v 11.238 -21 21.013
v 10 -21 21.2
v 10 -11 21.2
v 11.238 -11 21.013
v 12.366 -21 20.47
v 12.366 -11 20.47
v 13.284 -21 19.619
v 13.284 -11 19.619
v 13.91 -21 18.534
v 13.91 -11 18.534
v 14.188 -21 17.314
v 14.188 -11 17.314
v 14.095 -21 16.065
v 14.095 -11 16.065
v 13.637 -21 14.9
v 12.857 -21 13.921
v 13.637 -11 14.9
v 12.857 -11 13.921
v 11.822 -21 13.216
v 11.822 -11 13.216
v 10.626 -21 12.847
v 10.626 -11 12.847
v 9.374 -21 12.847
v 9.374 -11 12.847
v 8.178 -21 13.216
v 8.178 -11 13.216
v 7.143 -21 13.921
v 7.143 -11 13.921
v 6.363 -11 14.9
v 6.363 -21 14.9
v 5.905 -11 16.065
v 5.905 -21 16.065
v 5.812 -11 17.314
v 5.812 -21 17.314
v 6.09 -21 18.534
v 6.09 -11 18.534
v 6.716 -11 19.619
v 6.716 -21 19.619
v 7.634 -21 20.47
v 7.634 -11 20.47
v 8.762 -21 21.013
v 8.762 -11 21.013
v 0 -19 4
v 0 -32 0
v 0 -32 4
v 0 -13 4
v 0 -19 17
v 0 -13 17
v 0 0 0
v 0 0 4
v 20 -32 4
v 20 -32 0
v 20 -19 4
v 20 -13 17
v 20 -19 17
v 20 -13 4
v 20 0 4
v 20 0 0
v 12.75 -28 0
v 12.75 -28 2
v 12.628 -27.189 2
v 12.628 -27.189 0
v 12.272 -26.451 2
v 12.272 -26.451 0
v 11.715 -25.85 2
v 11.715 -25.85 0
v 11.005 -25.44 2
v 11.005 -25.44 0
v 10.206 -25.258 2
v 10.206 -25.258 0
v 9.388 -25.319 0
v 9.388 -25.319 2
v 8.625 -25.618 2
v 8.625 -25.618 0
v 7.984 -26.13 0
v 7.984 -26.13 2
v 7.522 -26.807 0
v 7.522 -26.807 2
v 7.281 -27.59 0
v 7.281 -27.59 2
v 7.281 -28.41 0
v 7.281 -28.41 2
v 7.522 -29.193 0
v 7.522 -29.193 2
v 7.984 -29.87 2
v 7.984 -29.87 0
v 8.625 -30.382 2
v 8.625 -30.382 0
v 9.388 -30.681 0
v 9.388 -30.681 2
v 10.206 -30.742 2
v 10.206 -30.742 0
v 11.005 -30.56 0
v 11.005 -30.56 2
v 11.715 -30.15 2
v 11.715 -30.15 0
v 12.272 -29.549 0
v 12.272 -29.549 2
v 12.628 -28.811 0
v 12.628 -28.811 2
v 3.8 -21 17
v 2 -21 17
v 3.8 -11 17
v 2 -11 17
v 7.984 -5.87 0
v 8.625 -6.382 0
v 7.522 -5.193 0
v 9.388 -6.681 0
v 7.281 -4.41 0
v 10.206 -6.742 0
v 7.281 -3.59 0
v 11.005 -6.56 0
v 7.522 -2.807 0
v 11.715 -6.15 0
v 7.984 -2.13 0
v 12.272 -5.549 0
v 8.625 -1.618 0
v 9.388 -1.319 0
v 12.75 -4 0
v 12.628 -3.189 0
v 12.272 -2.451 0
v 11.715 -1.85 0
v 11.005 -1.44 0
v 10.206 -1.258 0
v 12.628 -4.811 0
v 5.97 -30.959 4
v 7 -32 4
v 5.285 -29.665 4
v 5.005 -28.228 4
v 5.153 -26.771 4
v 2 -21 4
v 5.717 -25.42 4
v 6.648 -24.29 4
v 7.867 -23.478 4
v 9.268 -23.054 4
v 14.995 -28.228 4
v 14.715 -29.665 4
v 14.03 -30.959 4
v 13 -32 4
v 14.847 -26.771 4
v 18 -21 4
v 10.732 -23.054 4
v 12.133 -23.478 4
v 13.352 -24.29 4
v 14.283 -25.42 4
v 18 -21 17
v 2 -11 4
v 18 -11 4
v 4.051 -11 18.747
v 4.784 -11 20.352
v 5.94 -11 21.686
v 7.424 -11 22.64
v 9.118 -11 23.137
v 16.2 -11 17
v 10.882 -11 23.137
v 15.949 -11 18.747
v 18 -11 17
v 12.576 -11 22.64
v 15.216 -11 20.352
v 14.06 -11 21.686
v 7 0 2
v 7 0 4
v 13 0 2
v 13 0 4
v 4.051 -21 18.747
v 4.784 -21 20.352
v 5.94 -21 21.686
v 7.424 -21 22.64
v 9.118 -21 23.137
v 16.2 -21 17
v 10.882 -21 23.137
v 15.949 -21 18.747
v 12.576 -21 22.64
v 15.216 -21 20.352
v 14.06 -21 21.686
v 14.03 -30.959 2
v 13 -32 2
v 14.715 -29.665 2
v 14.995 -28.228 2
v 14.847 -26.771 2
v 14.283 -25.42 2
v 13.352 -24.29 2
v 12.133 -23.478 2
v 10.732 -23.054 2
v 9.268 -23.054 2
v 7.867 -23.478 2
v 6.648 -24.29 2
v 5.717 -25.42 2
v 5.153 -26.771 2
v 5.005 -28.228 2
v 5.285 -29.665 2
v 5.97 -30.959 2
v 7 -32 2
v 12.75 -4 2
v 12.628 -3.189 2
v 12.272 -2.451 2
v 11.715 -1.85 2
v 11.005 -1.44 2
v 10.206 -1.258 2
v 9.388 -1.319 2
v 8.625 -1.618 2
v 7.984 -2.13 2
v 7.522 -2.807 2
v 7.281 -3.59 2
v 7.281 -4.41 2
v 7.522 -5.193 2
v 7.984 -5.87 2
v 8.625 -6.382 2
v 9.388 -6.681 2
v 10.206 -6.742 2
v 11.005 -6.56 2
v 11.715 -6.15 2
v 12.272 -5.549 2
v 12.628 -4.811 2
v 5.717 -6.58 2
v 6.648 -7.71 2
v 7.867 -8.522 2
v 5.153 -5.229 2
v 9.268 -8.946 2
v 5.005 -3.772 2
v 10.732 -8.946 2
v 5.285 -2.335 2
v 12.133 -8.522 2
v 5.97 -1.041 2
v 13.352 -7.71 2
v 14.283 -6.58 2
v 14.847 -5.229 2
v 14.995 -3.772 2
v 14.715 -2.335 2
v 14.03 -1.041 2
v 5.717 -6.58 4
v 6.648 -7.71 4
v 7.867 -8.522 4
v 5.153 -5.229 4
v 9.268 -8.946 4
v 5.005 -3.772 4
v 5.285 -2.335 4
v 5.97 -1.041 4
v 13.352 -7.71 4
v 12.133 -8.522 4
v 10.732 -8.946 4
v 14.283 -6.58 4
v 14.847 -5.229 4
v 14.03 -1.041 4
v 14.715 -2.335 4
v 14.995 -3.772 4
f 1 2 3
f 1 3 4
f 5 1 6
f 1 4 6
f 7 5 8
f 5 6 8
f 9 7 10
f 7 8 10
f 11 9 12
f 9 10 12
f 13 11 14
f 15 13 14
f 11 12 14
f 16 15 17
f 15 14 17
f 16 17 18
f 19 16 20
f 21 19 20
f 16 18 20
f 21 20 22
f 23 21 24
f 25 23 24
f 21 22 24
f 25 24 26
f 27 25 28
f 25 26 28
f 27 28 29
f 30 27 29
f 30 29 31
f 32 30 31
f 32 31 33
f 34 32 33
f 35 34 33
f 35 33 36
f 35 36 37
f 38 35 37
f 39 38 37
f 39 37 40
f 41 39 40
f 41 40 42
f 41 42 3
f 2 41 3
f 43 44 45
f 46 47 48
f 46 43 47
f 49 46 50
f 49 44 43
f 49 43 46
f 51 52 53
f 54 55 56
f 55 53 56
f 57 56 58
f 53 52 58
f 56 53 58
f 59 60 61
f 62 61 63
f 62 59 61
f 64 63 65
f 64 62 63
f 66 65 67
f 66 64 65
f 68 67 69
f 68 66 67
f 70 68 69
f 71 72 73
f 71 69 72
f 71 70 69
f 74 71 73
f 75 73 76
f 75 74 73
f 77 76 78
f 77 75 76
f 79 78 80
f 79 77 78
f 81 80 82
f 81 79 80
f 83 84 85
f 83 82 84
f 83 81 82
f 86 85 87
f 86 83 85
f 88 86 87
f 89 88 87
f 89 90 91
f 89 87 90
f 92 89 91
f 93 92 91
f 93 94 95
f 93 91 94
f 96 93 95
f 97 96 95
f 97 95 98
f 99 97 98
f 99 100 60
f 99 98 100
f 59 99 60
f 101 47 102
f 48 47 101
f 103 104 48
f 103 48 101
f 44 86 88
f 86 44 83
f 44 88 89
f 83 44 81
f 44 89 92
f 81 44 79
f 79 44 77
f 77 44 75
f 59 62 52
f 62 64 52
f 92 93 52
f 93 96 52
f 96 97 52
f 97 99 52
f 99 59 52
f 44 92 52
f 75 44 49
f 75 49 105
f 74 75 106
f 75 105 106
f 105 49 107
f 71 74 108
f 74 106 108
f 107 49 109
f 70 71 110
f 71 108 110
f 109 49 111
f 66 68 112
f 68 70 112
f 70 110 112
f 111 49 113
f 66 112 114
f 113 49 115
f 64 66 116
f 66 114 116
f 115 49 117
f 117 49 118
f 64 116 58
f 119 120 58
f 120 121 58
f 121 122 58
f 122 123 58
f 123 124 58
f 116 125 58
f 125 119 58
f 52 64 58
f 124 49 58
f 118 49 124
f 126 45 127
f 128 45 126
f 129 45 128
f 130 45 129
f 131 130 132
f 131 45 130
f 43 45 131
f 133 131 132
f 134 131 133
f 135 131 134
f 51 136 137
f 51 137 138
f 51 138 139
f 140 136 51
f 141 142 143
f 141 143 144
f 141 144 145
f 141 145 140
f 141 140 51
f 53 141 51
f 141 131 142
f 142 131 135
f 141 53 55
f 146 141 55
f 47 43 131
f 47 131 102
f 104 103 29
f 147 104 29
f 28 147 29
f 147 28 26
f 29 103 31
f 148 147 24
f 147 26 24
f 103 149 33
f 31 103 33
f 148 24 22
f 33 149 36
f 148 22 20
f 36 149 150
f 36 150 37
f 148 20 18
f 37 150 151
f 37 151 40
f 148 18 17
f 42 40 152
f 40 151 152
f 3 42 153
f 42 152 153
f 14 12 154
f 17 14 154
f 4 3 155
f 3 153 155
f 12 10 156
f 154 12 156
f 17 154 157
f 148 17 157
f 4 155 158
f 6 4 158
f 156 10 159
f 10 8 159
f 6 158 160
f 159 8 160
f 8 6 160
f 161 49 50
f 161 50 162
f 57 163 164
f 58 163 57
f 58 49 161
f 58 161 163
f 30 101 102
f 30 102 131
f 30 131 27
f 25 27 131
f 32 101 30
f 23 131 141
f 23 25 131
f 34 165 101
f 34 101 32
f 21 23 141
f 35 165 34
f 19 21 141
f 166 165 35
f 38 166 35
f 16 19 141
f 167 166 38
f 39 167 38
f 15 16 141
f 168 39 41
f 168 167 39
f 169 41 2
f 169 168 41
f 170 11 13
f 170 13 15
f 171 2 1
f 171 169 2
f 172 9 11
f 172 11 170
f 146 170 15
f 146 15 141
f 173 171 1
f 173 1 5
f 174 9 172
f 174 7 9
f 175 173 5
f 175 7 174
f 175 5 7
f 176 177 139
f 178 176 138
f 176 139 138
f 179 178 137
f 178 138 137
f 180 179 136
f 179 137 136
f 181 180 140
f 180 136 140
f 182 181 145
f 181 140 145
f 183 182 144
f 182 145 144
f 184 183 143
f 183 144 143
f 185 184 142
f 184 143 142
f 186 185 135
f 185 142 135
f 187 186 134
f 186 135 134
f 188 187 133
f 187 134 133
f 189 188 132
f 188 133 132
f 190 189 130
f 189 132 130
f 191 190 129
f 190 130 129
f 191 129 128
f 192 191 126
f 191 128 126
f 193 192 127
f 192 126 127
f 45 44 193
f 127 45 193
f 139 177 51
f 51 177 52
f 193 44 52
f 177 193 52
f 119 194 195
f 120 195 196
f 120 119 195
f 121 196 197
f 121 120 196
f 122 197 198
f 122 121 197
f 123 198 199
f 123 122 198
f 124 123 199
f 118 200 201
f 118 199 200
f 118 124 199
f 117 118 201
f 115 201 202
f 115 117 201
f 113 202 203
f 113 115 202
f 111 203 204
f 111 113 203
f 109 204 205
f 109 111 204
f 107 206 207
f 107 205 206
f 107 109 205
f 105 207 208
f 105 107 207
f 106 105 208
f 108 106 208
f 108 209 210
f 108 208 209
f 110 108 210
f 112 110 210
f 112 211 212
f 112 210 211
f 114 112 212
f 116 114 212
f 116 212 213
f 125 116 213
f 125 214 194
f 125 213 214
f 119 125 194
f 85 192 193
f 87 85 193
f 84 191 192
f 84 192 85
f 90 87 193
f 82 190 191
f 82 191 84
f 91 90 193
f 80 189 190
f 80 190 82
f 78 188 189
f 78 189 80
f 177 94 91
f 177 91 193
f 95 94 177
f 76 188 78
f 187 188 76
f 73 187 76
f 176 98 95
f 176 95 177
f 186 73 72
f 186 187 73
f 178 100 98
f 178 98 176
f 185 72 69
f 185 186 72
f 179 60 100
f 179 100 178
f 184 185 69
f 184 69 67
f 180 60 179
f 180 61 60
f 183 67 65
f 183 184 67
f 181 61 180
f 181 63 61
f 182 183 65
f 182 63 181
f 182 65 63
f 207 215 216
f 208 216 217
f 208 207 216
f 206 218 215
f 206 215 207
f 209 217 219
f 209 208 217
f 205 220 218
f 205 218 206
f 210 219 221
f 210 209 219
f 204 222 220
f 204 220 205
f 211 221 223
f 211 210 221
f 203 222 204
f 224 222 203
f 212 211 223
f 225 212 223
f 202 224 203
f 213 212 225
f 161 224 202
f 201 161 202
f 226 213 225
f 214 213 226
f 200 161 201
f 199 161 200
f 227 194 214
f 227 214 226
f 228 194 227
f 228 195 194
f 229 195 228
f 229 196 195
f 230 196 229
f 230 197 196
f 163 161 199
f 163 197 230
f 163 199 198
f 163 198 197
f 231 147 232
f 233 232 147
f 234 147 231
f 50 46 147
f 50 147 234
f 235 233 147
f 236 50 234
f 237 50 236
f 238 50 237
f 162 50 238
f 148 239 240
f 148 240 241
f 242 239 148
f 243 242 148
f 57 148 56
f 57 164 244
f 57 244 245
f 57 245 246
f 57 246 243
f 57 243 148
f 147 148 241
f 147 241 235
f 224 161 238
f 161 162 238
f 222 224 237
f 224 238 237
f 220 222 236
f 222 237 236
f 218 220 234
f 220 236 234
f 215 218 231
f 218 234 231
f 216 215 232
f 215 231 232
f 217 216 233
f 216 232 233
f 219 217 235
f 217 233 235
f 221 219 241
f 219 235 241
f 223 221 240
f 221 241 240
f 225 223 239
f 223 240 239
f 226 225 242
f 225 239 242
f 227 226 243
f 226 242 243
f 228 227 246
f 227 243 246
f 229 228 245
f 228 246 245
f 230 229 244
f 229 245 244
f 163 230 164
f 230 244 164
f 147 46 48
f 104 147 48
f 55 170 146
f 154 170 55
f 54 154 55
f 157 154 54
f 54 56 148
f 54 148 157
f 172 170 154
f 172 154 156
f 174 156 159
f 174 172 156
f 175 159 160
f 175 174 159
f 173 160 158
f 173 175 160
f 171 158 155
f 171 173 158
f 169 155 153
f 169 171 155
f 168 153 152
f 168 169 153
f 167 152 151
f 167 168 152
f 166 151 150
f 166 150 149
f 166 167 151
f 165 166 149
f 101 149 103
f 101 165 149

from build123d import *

# Parameters (mm, degrees)
SKETCH_1_W          = 20
SKETCH_1_H          = 32
SKETCH_1_R          = 2.75
EXTRUDE_1_DEPTH     = 4
SKETCH_2_W          = 20
SKETCH_2_H          = 10
EXTRUDE_2_DEPTH     = 13
SKETCH_4_R          = 6.2
EXTRUDE_3_DEPTH     = 10
SKETCH_5_R          = 4.2
CUT_EXTRUDE_1_DEPTH = 13
CHAMFER_1_SIZE      = 2
SKETCH_6_R          = 5
CUT_EXTRUDE_2_DEPTH = 2


with BuildPart() as part:
    # 草图1 → 凸台-拉伸1 (new body)
    with BuildSketch(Plane.XY):
        with Locations((10, -16)):
            Rectangle(SKETCH_1_W, SKETCH_1_H)
        with Locations((10, -4)):
            Circle(SKETCH_1_R, mode=Mode.SUBTRACT)
        with Locations((10, -28)):
            Circle(SKETCH_1_R, mode=Mode.SUBTRACT)
    extrude(amount=EXTRUDE_1_DEPTH)

    # 草图2 → 凸台-拉伸2 (add)
    with BuildSketch(Plane.XY.offset(4)):
        with Locations((10, -16)):
            Rectangle(SKETCH_2_W, SKETCH_2_H)
    extrude(amount=EXTRUDE_2_DEPTH)

    # 草图4 → 凸台-拉伸3 (add)
    with BuildSketch(Plane.XZ.offset(21)):
        with Locations((10, 17)):
            Circle(SKETCH_4_R)
    extrude(amount=-EXTRUDE_3_DEPTH)

    # 草图5 → 切除-拉伸1 (cut)
    with BuildSketch(Plane(origin=(0, -11, 0), x_dir=(1, 0, 0), z_dir=(0, 1, 0))):
        with Locations(Location((10, -17, 0), (0, 0, 270))):
            Circle(SKETCH_5_R)
    extrude(amount=-CUT_EXTRUDE_1_DEPTH, mode=Mode.SUBTRACT)

    # 倒角1
    chamfer_1_edges = [part.edges().sort_by_distance(p)[0] for p in [
        (0, -11, 10.5),
        (0, -21, 10.5),
        (20, -21, 10.5),
        (20, -11, 10.5),
    ]]
    chamfer(chamfer_1_edges, length=CHAMFER_1_SIZE)

    # 草图6 → 切除-拉伸2 (cut)
    with BuildSketch(Plane.XY.offset(4)):
        with Locations((10, -28)):
            Circle(SKETCH_6_R)
        with Locations((10, -4)):
            Circle(SKETCH_6_R)
    extrude(amount=-CUT_EXTRUDE_2_DEPTH, mode=Mode.SUBTRACT)


solid = part.part
